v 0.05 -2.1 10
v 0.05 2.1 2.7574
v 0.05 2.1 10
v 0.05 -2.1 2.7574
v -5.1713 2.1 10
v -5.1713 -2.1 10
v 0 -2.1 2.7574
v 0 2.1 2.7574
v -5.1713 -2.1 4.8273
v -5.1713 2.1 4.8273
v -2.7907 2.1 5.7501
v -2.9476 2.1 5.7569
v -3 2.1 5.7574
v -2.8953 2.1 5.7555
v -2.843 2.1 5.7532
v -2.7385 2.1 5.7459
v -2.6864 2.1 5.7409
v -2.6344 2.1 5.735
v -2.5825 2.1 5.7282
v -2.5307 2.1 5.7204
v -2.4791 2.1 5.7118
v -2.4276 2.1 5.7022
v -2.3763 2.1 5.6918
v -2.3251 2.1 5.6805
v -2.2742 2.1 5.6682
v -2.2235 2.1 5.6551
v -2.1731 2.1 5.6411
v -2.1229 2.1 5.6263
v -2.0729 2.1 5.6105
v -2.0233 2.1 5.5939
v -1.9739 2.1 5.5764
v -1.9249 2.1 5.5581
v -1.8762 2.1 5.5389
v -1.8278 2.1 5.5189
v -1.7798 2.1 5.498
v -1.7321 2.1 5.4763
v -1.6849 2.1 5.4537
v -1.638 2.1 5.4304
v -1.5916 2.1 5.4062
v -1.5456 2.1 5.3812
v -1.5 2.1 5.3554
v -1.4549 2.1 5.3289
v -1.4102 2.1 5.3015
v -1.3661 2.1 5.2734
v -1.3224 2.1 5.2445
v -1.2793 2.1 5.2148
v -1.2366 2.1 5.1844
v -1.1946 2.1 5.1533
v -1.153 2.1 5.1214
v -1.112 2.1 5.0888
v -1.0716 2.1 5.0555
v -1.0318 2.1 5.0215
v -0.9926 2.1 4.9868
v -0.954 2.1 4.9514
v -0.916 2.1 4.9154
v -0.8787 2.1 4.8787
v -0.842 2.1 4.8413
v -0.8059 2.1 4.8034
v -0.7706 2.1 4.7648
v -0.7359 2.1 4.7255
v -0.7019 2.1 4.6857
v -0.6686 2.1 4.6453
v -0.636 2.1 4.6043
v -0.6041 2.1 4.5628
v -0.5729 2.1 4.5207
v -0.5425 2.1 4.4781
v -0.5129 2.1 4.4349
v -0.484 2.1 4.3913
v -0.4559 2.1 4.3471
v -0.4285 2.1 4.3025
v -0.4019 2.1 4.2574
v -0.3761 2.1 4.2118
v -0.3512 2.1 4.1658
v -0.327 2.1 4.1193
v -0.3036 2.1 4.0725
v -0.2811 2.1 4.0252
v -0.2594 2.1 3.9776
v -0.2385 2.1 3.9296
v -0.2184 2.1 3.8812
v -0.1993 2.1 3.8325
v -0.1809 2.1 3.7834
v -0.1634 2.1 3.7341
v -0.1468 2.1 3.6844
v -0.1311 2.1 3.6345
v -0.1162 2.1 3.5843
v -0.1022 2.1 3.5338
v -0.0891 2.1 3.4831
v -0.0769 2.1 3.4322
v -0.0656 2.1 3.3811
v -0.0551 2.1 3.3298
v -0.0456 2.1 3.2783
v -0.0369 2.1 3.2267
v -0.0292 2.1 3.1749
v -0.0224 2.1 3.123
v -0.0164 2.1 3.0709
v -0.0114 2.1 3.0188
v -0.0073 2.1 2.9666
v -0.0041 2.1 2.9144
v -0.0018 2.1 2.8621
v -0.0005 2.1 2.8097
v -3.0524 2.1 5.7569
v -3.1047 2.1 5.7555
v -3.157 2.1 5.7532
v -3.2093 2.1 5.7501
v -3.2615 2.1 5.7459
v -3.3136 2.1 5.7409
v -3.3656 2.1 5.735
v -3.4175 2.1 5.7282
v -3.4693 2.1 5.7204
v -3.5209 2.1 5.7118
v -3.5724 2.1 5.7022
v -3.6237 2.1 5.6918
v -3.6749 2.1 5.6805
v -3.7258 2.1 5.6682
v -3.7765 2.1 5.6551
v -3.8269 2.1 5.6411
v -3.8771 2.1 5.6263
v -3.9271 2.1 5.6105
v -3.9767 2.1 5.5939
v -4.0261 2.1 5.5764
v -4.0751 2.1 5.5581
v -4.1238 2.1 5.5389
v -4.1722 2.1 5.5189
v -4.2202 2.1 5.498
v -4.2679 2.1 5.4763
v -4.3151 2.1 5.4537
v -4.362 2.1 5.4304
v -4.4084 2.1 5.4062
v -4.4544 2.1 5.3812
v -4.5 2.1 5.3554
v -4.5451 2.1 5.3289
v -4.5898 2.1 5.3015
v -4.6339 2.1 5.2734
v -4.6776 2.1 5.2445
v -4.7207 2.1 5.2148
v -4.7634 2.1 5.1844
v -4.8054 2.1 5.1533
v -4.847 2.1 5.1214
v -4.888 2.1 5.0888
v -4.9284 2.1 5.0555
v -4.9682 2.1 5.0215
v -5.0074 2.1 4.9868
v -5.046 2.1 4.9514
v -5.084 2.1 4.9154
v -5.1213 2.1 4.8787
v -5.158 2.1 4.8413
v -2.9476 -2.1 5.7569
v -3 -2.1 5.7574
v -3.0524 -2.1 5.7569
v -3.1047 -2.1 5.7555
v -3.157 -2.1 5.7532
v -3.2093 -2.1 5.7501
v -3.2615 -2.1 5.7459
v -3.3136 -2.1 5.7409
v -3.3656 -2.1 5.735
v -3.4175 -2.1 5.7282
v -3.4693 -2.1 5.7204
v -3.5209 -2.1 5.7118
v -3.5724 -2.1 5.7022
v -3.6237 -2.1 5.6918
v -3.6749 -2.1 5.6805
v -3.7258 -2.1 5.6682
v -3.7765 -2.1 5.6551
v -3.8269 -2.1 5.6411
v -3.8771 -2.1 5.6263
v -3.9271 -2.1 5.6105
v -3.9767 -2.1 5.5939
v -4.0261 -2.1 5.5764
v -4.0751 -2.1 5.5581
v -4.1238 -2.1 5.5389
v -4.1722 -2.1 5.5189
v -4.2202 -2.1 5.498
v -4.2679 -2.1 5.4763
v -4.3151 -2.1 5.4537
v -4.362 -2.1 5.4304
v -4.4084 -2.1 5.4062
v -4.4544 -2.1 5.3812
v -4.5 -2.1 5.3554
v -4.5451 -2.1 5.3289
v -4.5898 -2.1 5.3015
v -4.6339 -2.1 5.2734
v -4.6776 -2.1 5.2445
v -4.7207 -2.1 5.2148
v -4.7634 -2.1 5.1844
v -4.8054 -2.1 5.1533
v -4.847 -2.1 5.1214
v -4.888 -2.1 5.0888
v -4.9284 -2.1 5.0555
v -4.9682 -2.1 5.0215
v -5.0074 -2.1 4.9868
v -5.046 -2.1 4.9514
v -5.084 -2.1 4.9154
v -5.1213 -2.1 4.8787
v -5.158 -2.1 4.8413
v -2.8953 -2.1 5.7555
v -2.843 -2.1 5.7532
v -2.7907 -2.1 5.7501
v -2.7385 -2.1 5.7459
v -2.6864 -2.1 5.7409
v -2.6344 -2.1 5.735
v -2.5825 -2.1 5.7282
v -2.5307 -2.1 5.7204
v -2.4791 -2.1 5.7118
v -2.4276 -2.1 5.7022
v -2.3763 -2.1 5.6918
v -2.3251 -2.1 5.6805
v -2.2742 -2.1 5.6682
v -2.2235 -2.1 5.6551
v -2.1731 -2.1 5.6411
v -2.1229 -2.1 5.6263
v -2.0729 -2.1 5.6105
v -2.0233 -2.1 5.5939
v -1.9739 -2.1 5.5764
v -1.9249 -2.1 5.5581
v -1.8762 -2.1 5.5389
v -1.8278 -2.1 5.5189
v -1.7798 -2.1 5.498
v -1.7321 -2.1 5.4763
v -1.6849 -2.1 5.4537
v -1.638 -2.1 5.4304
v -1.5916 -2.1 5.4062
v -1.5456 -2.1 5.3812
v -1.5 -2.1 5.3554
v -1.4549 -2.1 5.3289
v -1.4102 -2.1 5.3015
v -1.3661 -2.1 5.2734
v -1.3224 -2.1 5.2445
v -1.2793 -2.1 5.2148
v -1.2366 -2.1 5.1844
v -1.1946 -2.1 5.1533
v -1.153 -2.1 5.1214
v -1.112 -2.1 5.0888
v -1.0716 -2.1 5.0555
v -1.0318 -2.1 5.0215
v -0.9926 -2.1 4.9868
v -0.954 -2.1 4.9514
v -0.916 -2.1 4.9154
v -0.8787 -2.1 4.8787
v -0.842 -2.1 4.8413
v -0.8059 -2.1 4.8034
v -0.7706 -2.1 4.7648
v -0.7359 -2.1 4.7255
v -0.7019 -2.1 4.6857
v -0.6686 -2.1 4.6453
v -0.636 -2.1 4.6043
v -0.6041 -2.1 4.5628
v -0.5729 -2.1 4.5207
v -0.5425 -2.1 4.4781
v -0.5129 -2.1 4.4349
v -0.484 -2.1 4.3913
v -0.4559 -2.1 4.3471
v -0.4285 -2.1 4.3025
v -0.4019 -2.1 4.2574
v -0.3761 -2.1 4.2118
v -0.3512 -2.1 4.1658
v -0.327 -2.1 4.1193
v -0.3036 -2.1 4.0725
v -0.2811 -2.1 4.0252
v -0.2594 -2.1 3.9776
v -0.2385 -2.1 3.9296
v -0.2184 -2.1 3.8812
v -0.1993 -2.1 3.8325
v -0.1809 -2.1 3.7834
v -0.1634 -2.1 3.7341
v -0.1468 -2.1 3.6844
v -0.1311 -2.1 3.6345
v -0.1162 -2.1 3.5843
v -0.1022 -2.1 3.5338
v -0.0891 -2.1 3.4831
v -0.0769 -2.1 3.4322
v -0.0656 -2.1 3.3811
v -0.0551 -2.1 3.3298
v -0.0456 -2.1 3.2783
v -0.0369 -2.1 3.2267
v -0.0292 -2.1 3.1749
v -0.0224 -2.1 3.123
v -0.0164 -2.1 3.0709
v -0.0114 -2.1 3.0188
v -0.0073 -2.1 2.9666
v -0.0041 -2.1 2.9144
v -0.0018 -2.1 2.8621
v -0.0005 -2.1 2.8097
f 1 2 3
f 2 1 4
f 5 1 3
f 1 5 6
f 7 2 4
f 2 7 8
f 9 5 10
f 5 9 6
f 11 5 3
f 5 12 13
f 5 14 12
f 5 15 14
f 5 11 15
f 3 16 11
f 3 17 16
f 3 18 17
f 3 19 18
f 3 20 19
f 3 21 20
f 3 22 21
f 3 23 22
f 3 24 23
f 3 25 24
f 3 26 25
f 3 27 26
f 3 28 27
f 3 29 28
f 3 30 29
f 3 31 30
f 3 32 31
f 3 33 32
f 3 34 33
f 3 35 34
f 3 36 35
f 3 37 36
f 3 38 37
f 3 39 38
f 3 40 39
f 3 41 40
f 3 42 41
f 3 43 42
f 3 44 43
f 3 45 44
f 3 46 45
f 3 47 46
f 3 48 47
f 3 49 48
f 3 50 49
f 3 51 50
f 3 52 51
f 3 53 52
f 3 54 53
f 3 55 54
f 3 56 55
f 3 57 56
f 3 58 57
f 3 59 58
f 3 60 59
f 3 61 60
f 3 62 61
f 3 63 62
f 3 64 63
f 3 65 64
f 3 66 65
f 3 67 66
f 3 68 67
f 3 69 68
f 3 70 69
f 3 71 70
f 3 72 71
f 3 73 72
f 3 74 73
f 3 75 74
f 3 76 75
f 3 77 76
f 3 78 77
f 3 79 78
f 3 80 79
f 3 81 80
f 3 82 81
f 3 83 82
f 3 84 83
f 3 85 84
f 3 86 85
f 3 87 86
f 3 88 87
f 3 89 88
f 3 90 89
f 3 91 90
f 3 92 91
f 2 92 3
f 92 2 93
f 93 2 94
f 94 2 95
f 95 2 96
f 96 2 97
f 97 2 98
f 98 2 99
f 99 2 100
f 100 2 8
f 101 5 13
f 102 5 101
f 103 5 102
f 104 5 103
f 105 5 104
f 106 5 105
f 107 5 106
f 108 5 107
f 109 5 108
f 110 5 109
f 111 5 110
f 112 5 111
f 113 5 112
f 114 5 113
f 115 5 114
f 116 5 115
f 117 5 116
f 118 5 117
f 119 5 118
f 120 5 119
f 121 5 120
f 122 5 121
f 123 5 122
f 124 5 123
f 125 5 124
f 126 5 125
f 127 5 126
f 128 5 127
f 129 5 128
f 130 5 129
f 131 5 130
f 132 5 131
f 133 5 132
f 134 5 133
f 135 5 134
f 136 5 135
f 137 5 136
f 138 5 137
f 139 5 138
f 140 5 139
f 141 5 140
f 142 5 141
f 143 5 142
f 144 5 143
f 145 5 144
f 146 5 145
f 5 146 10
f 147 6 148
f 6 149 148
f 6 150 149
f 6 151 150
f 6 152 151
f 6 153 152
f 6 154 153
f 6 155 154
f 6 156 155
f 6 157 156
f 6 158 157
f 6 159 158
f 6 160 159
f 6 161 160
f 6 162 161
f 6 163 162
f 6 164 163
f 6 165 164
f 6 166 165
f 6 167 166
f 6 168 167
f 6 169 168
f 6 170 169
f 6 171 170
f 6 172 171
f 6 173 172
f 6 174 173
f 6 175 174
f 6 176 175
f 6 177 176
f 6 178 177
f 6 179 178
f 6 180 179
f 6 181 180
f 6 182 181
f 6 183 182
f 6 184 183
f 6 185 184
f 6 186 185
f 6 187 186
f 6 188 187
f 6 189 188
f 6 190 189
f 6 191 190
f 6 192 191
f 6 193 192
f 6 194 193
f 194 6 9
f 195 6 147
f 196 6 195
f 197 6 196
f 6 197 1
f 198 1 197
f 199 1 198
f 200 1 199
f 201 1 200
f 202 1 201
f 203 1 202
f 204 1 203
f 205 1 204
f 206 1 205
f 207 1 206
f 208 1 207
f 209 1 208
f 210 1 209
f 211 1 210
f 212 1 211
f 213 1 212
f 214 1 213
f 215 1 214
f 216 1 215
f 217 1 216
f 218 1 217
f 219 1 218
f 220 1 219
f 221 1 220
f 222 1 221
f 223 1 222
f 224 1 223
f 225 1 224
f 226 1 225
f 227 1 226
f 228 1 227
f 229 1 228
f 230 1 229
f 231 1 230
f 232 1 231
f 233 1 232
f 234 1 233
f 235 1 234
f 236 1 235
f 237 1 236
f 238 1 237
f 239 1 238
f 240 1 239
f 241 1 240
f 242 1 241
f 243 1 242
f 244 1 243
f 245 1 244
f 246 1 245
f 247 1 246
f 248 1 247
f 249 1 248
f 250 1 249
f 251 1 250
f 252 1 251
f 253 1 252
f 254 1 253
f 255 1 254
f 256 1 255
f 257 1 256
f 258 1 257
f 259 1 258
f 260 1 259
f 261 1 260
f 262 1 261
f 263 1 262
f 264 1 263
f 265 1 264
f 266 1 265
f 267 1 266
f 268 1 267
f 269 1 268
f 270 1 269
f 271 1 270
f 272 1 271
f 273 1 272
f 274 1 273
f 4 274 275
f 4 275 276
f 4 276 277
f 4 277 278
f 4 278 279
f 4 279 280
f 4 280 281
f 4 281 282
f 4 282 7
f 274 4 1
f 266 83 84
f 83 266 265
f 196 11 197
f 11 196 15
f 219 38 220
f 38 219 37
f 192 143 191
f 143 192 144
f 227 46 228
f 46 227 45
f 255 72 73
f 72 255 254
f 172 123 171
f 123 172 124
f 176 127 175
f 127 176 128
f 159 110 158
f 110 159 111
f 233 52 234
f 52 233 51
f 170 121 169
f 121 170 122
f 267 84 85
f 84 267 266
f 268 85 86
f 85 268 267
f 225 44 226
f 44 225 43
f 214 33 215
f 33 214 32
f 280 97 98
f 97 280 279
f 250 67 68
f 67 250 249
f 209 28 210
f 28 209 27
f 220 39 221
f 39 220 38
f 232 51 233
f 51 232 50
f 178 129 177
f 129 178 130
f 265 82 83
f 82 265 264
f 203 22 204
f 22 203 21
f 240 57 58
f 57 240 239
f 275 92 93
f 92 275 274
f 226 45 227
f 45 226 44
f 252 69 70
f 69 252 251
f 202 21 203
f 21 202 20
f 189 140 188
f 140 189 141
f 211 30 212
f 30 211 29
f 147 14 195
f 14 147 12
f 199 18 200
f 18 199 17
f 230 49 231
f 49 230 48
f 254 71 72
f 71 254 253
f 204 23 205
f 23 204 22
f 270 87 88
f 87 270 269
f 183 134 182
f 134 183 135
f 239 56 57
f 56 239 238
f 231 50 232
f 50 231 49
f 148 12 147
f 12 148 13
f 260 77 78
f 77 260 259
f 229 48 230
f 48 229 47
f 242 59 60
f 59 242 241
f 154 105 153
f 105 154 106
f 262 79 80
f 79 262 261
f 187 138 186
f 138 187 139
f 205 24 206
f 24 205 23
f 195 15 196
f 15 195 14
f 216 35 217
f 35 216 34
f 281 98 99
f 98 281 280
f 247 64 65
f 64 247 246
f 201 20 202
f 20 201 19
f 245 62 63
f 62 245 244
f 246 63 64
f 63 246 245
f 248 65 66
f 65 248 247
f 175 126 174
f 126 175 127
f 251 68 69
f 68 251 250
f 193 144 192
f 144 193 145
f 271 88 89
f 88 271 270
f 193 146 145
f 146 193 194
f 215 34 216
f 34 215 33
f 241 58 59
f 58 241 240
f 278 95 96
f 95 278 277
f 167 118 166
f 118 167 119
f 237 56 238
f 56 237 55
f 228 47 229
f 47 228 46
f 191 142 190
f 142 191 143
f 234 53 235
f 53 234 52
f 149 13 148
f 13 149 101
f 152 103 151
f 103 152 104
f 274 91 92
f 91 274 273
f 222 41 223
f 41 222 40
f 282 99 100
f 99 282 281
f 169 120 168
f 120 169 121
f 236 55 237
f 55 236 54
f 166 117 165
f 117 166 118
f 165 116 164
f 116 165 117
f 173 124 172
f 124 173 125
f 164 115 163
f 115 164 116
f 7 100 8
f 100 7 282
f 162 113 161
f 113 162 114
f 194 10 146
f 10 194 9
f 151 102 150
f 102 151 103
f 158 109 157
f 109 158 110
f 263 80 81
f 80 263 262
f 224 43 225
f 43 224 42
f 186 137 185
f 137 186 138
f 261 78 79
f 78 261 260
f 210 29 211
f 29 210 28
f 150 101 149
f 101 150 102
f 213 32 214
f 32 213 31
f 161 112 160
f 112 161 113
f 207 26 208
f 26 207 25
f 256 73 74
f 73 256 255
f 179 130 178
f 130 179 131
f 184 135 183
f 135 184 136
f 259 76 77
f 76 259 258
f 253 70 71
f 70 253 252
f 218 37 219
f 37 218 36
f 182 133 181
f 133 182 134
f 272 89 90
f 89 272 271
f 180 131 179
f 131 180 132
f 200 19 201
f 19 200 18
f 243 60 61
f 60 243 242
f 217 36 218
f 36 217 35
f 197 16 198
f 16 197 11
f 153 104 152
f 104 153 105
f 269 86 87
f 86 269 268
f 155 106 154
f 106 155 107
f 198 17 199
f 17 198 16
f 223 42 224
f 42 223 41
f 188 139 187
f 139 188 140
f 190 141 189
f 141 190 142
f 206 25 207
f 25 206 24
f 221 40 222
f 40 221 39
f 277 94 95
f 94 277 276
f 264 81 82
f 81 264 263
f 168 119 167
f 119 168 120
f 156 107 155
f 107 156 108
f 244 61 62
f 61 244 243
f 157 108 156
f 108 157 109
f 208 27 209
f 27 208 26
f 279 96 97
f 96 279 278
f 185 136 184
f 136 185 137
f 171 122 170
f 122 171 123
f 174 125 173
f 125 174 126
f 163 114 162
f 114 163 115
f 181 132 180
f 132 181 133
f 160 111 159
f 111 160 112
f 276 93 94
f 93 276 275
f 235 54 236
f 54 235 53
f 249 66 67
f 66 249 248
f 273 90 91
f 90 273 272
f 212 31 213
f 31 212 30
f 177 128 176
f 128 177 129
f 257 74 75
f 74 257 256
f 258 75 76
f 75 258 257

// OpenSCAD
pad = 0.1;	// Padding to maintain manifold
b = 10;
h = 10;
w = 4;
r = 3;	// Radius of round
smooth = 360;	// Number of facets of rounding cylinder

z = h - r*h/b - r*pow(pow(h,2)+pow(b,2),0.5)/b;
// x3 = width of cutting block
x3 = r*h/pow(pow(h,2)+pow(b,2),0.5) + r;

translate([0,0,z])
	difference() {
		translate([-x3/2,0,(h-z)/2])
			cube([x3+pad,w+2*pad,h-z],center=true);
		translate([-r,0,0])
			rotate(a=[0,90,90])
				cylinder(w+4*pad,r,r,center=true,$fn=smooth);
	}
